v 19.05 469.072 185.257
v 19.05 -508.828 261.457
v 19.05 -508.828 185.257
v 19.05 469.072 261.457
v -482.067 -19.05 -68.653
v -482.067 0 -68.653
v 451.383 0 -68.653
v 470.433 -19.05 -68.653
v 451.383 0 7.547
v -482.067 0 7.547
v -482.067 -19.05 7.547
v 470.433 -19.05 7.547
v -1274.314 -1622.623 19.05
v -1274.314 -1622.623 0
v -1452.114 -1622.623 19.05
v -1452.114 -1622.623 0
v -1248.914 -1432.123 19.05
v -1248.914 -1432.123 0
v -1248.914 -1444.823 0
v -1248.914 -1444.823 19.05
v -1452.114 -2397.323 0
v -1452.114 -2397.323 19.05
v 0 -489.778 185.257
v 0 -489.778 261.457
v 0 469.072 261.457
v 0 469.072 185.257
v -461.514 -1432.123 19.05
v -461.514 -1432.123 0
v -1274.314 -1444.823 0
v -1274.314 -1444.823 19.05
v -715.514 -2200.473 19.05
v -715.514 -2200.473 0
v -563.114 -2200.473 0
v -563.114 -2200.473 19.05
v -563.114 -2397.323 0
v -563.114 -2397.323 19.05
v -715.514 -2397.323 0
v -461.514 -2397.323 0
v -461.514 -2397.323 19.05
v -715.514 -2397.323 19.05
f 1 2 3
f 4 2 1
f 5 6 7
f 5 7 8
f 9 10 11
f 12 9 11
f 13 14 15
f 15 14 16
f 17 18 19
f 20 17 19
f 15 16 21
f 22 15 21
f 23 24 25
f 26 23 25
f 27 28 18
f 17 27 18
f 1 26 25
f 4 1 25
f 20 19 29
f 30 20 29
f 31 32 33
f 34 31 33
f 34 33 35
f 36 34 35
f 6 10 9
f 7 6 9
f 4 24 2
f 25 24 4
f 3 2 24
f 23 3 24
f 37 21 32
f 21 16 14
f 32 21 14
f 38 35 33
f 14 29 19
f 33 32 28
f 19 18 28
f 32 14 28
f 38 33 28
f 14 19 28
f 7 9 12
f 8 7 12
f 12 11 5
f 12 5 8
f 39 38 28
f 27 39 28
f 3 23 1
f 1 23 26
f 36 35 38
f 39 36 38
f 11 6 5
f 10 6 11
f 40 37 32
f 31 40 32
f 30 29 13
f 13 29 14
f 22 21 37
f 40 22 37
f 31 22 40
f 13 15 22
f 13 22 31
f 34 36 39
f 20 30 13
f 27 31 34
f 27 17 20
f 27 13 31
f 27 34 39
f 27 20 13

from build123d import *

# Parameters (mm, degrees)
F0_W     = 952.5
F0_H     = 76.2
F1_DEPTH = 19.05
F3_DEPTH = 76.2
F4_W     = 977.9
F4_H     = 76.2
F5_DEPTH = 19.05
F7_DEPTH = 76.2
F9_DEPTH = 19.05


with BuildPart() as f1:
    # F0 (on Front) → F1 (new body)
    with BuildSketch(Plane.XZ):
        with Locations((-5.816747, -30.552551)):
            Rectangle(F0_W, F0_H)
    extrude(amount=F1_DEPTH)

    # F2 (on face) → F3 (cut)
    with BuildSketch(Plane.XY.offset(7.547449)):
        Polygon((451.383253, 0), (470.433253, -19.05), (470.433253, 0), align=None)
    extrude(amount=-F3_DEPTH, mode=Mode.SUBTRACT)


with BuildPart() as f5:
    # F4 (on Right) → F5 (new body)
    with BuildSketch(Plane.YZ):
        with Locations((-19.878419, 223.357007)):
            Rectangle(F4_W, F4_H)
    extrude(amount=F5_DEPTH)

    # F6 (on face) → F7 (cut)
    with BuildSketch(Plane.XY.offset(261.457007)):
        Polygon((0, -508.828419), (19.05, -508.828419), (0, -489.778419), align=None)
    extrude(amount=-F7_DEPTH, mode=Mode.SUBTRACT)


with BuildPart() as f9:
    # F8 (on Top) → F9 (new body)
    with BuildSketch(Plane.XY):
        Polygon((-1452.114036, -1622.623456), (-1452.114036, -2397.323456), (-715.514036, -2397.323456), (-715.514036, -2200.473456), (-563.114036, -2200.473456), (-563.114036, -2397.323456), (-461.514036, -2397.323456), (-461.514036, -1432.123456), (-1248.914036, -1432.123456), (-1248.914036, -1444.823456), (-1274.314036, -1444.823456), (-1274.314036, -1622.623456), align=None)
    extrude(amount=F9_DEPTH)


solid = Compound([f1.part, f5.part, f9.part])
